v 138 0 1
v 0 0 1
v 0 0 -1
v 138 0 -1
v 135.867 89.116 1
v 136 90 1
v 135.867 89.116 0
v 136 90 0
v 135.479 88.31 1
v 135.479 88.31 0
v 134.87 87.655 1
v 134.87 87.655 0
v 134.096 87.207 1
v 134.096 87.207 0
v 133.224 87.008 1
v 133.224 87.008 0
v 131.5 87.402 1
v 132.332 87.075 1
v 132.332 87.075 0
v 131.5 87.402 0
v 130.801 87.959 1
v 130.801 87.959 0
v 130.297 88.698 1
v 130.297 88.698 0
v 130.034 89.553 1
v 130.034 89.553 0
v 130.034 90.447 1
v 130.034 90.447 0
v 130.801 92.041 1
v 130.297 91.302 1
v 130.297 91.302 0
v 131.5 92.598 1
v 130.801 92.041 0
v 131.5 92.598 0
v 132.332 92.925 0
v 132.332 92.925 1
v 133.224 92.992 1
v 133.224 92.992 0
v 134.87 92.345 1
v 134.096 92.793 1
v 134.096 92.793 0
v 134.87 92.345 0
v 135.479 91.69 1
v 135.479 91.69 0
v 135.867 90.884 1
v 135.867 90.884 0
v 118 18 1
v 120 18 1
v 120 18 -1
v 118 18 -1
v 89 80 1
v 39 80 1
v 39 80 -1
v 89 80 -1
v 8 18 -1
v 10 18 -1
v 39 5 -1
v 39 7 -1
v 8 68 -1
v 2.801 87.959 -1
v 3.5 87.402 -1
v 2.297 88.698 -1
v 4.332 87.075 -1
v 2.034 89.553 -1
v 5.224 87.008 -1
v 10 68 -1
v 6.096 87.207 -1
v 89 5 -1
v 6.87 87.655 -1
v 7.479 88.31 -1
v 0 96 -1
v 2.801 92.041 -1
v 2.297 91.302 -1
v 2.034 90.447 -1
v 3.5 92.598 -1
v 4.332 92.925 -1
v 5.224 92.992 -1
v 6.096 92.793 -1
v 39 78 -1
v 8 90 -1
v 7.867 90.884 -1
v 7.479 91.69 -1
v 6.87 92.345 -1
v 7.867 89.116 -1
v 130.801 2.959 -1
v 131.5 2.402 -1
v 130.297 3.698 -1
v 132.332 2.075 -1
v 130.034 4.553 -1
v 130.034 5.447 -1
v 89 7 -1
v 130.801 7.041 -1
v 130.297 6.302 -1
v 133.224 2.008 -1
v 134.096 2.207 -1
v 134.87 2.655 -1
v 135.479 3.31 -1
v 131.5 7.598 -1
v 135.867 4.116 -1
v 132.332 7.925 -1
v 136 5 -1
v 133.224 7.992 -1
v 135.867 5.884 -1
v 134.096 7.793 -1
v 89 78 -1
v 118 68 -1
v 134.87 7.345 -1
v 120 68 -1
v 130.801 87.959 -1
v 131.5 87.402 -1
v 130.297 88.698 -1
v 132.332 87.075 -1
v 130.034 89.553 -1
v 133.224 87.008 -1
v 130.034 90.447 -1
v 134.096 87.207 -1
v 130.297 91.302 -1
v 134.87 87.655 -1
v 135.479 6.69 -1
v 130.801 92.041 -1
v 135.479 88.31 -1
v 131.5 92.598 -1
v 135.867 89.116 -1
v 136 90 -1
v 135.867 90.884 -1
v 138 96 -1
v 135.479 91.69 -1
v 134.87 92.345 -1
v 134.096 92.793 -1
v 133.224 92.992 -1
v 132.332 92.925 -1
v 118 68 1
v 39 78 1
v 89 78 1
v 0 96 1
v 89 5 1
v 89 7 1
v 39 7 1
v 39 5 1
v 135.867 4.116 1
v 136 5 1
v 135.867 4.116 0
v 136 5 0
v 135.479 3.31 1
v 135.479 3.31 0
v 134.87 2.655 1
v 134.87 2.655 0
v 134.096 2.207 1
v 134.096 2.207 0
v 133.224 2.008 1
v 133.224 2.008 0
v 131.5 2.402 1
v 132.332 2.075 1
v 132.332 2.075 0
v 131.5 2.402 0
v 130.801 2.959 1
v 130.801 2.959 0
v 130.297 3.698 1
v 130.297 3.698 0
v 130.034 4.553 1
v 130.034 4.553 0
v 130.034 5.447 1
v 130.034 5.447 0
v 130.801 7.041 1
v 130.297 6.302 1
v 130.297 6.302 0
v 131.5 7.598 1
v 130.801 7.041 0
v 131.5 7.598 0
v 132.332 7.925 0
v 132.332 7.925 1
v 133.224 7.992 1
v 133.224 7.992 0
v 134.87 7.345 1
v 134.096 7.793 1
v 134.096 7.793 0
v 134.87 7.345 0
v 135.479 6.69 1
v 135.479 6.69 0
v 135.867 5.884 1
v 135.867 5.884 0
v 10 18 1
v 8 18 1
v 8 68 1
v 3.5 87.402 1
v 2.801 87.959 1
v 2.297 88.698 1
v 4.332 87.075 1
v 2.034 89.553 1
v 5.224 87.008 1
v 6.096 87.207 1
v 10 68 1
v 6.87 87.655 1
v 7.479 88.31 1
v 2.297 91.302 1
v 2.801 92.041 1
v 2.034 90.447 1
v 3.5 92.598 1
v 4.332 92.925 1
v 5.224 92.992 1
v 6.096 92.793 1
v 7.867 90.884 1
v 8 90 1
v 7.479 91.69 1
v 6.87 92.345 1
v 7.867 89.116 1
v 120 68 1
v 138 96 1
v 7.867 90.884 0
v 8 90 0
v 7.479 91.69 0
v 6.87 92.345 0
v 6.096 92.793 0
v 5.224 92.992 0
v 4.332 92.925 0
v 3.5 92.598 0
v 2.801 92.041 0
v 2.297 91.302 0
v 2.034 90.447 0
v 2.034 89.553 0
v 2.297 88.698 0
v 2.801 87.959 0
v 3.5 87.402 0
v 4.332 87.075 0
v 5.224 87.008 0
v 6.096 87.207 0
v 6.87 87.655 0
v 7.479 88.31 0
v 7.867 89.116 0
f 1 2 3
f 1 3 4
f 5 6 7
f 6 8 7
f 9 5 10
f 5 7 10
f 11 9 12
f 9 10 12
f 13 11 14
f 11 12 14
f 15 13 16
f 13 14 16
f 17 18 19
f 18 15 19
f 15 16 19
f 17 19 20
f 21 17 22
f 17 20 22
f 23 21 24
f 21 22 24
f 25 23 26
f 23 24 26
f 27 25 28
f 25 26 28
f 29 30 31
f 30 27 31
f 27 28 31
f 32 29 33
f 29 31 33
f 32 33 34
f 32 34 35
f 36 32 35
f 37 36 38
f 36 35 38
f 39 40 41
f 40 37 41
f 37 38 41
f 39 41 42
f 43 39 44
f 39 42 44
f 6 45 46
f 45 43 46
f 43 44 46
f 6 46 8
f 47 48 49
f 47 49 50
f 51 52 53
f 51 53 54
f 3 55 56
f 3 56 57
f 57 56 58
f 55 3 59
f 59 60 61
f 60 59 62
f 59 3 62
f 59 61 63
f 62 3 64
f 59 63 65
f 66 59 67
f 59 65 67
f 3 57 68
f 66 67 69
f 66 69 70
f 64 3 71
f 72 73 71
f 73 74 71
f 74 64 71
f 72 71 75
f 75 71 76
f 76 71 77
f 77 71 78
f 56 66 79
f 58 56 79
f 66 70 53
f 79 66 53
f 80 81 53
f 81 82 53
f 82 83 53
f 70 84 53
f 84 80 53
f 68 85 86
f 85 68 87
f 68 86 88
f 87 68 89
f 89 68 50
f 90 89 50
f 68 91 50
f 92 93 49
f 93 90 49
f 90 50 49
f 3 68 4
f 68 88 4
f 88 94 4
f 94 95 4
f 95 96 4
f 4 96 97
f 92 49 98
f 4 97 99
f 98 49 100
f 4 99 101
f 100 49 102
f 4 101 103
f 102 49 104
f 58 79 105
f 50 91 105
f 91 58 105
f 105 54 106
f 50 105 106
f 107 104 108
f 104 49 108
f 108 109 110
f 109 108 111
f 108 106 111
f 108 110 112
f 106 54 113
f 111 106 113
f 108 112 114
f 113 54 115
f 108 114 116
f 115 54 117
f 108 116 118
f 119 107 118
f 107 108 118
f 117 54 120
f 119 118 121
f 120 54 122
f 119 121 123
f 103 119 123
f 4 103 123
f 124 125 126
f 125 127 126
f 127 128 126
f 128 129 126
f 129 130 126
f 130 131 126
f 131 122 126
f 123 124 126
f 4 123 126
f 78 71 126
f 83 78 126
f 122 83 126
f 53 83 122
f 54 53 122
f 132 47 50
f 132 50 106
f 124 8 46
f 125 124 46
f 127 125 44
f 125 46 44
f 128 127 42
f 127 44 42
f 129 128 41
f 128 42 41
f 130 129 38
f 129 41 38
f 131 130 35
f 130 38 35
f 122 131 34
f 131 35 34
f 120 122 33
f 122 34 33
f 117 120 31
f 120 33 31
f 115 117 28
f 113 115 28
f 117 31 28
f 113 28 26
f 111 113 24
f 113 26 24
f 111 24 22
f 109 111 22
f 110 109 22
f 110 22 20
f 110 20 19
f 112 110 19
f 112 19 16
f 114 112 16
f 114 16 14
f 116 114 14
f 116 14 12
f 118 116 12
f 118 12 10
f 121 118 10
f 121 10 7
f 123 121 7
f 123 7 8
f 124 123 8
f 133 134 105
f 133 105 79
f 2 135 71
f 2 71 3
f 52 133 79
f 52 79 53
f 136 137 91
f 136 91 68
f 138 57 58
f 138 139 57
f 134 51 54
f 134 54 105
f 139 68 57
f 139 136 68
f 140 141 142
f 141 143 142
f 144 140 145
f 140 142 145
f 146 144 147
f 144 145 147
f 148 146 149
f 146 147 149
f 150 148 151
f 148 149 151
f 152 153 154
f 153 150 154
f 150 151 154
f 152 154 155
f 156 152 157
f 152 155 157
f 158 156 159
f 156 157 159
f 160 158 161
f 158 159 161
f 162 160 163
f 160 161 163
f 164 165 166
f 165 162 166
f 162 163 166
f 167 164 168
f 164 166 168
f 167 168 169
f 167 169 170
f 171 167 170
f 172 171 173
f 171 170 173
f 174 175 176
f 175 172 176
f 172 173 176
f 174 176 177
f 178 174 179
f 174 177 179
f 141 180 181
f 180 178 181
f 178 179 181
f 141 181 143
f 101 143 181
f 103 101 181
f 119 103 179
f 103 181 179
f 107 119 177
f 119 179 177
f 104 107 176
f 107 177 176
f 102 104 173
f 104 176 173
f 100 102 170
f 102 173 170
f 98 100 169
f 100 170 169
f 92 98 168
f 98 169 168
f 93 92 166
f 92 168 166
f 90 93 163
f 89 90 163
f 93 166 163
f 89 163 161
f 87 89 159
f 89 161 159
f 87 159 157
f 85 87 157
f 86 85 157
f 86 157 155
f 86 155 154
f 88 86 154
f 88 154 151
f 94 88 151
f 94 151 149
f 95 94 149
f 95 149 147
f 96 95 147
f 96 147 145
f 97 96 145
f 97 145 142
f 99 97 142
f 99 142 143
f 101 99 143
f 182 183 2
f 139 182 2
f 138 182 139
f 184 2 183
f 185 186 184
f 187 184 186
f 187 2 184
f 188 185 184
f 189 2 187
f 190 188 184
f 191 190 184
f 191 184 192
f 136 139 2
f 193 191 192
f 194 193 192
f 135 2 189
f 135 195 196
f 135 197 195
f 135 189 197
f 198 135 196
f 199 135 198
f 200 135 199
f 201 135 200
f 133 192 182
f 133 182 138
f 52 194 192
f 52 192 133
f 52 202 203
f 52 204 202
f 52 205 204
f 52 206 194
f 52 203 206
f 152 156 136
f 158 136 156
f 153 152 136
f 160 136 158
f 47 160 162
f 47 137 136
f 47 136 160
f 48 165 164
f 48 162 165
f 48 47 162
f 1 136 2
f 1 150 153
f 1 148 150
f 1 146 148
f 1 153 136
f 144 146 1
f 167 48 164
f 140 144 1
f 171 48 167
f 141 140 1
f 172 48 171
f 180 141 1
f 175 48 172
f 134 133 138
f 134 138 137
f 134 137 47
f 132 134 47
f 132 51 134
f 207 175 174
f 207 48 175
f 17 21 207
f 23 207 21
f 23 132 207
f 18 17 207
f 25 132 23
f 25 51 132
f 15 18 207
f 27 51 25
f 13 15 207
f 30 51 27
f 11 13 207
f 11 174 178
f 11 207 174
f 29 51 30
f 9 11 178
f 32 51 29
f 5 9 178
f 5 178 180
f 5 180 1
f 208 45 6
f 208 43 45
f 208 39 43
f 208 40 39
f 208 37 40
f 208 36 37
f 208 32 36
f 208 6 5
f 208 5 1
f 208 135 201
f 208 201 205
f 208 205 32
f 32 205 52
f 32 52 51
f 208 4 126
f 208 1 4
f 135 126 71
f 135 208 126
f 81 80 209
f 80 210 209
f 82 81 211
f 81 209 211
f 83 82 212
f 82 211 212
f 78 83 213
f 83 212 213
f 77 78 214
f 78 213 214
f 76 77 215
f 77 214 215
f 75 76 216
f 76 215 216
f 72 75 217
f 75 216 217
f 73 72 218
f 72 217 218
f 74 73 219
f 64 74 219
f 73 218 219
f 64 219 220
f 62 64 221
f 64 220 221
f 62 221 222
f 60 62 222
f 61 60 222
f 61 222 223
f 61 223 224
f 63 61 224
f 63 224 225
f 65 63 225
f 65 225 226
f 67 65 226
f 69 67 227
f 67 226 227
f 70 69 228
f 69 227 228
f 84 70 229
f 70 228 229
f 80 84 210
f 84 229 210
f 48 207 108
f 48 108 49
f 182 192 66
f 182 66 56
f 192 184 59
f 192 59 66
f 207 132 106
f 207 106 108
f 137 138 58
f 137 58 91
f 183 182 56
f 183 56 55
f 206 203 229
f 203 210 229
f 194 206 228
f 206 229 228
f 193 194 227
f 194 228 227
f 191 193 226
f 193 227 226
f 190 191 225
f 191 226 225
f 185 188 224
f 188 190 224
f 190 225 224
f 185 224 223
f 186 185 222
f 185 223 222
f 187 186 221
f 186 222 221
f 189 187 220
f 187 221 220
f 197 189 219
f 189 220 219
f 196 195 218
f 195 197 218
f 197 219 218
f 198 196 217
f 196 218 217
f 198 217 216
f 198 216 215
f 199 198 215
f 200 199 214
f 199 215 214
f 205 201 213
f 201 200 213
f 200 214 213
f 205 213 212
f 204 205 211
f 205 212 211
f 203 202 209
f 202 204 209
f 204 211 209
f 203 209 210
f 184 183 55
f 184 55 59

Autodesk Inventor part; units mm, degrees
ref_plane "YZ Plane" through (0, 0, 0) normal (1, 0, 0) x (0, 1, 0)
ref_plane "XZ Plane" through (0, 0, 0) normal (0, 1, 0) x (-1, 0, 0)
ref_plane "XY Plane" through (0, 0, 0) normal (0, 0, 1) x (1, 0, 0)
sketch "Sketch2" plane through (0, 0, 0) normal (0, 0, 1) x (1, 0, 0)
  circle A0 centre (5, 90) radius 3
  circle A1 centre (133, 5) radius 3
  circle A2 centre (133, 90) radius 3
  line L0 (0, 0) -> (138, 0)
  line L1 (138, 0) -> (138, 96)
  line L2 (138, 96) -> (0, 96)
  line L3 (0, 96) -> (0, 0)
  circle A3 centre (6, 20) radius 2
  circle A4 centre (6, 66) radius 2
  circle A5 centre (122, 40) radius 2
extrude "Extrusion2" add sketch "Sketch2" along normal mid plane 2 contours L3 L2 L1 L0 | A3 | A4 | A5
sketch "Sketch3" plane through (0, 0, 1) normal (0, 0, 1) x (1, 0, 0)
  circle A0 centre (6, 20) radius 2 construction
  circle A1 centre (6, 20) radius 0.5
  point P0 (0, 0)
  dimension "d4" = 1
extrude "Extrusion3" [suppressed]
sketch "Sketch4" plane through (0, 0, 1) normal (0, 0, 1) x (1, 0, 0)
  circle A0 centre (6, 66) radius 2 projected
  circle A1 centre (6, 66) radius 0.5
  point P0 (0, 0)
  dimension "d7" = 1
extrude "Extrusion4" [suppressed]
sketch "Sketch5" plane through (0, 0, 1) normal (0, 0, 1) x (1, 0, 0)
  circle A0 centre (122, 40) radius 2 projected
  circle A1 centre (122, 40) radius 0.5
  point P0 (0, 0)
  dimension "d10" = 1
extrude "Extrusion5" [suppressed]
ref_plane "Work Plane1" through (64, 0, 1) normal (-1, 0, 0) x (0, 0, 1)
ref_plane "Work Plane2" through (0, 43, 1) normal (0, -1, 0) x (1, 0, 0)
sketch "Sketch7" plane through (0, 0, 1) normal (0, 0, 1) x (1, 0, 0)
  line L0 (39, 7) -> (89, 7)
  line L1 (89, 7) -> (89, 5)
  line L2 (89, 5) -> (39, 5)
  line L3 (39, 5) -> (39, 7)
  line L4 (64, -19.2) -> (64, 115.2) construction
  line L5 (165.6, 43) -> (-27.6, 43) construction
  line L6 (0, 0) -> (138, 0) projected
  line L7 (8, 68) -> (10, 68)
  line L8 (10, 68) -> (10, 18)
  line L9 (10, 18) -> (8, 18)
  line L10 (8, 18) -> (8, 68)
  line L11 (0, 96) -> (0, 0) projected
  line L12 (118, 68) -> (120, 68)
  line L13 (120, 68) -> (120, 18)
  line L14 (120, 18) -> (118, 18)
  line L15 (118, 18) -> (118, 68)
  line L16 (39, 80) -> (89, 80)
  line L17 (89, 80) -> (89, 78)
  line L18 (89, 78) -> (39, 78)
  line L19 (39, 78) -> (39, 80)
  point P0 (64, 7)
  point P1 (10, 43)
  point P2 (118, 43)
  point P3 (64, 78)
  dimension "d15" = 2
  dimension "d16" = 5
  dimension "d17" = 50
  dimension "d18" = 2
  dimension "d19" = 50
  dimension "d20" = 8
  dimension "d23" = 50
  dimension "d24" = 2
  dimension "d25" = 118
  dimension "d26" = 2
  dimension "d27" = 50
  dimension "d28" = 78
extrude "Extrusion6" cut sketch "Sketch7" against normal through all
properties part number "mount_plate"
